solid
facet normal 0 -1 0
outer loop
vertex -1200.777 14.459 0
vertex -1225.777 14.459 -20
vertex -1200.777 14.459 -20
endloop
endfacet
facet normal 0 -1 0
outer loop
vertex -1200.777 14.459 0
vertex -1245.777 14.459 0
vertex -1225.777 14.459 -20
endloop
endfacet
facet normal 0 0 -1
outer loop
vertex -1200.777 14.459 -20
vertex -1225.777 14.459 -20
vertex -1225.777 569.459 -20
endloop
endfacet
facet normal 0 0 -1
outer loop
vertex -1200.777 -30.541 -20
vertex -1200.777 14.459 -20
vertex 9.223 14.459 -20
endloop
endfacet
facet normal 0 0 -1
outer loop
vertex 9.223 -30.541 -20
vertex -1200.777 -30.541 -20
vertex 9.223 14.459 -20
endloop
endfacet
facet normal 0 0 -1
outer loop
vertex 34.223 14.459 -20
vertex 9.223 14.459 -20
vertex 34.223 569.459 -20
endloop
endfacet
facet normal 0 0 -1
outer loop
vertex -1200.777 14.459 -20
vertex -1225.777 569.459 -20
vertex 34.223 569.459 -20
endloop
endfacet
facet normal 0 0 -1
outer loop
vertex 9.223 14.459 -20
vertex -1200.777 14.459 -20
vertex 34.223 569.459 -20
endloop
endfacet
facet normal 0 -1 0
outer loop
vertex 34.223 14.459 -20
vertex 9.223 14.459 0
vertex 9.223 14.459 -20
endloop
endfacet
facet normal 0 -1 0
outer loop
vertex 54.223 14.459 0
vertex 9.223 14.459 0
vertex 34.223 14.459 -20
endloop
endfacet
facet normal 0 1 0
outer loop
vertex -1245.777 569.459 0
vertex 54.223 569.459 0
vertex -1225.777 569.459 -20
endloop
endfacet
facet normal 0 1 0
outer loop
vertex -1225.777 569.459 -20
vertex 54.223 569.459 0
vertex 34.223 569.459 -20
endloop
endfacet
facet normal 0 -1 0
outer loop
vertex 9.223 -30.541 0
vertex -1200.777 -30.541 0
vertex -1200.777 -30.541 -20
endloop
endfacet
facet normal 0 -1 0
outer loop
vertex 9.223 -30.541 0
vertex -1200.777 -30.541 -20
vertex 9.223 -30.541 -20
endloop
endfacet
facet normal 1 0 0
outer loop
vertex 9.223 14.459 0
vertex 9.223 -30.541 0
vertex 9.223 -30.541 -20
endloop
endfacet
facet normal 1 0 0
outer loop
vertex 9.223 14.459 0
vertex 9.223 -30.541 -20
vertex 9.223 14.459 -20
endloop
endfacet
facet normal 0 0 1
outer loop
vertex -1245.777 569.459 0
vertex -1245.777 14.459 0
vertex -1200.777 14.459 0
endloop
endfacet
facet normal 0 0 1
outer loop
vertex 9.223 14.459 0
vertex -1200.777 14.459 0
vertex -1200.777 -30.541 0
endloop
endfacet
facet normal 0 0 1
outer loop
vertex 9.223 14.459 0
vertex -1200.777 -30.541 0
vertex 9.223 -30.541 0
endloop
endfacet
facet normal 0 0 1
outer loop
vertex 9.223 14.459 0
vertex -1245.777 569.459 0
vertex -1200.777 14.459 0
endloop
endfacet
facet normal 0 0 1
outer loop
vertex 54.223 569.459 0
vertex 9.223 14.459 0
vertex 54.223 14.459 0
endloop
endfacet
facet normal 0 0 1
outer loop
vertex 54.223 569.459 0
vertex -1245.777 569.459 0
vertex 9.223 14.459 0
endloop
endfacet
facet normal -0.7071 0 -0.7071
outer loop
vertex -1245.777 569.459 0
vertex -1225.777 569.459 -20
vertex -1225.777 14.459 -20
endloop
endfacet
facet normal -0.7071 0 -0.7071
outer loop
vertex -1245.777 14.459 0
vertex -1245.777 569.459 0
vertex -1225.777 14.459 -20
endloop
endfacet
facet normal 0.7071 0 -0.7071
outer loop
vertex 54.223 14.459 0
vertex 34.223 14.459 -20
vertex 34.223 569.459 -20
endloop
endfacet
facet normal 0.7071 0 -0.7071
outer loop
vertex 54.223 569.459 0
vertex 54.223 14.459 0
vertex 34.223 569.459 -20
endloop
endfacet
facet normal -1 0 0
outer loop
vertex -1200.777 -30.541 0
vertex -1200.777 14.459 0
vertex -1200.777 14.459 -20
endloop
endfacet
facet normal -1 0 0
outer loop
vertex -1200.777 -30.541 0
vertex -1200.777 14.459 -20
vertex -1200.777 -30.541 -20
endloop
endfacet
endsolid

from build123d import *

# Parameters (mm, degrees)
F1_DEPTH = 20
F2_SIZE  = 19.99999


# Not quite as in the source:
# - a fillet or chamfer is up to 0.001 mm smaller than in the source, because OpenCascade refuses the exact size


with BuildPart() as f1:
    # F0 (on Top) → F1 (new body)
    with BuildSketch(Plane.XY):
        Polygon((54.2228519917, 569.4585297257), (-1245.7771480083, 569.4585297257), (-1245.7771480083, 14.4585297257), (-1200.7771480083, 14.4585297257), (-1200.7771480083, -30.5414702743), (9.2228519917, -30.5414702743), (9.2228519917, 14.4585297257), (54.2228519917, 14.4585297257), align=None)
    extrude(amount=-F1_DEPTH)

    # F2 (size 20 in the source; OpenCascade refuses exactly that, so slightly less here)
    f2_edges = [f1.edges().sort_by_distance(p)[0] for p in [
        (-1245.777148, 291.95853, -20),
        (54.222852, 291.95853, -20),
    ]]
    chamfer(f2_edges, length=F2_SIZE)


solid = f1.part
